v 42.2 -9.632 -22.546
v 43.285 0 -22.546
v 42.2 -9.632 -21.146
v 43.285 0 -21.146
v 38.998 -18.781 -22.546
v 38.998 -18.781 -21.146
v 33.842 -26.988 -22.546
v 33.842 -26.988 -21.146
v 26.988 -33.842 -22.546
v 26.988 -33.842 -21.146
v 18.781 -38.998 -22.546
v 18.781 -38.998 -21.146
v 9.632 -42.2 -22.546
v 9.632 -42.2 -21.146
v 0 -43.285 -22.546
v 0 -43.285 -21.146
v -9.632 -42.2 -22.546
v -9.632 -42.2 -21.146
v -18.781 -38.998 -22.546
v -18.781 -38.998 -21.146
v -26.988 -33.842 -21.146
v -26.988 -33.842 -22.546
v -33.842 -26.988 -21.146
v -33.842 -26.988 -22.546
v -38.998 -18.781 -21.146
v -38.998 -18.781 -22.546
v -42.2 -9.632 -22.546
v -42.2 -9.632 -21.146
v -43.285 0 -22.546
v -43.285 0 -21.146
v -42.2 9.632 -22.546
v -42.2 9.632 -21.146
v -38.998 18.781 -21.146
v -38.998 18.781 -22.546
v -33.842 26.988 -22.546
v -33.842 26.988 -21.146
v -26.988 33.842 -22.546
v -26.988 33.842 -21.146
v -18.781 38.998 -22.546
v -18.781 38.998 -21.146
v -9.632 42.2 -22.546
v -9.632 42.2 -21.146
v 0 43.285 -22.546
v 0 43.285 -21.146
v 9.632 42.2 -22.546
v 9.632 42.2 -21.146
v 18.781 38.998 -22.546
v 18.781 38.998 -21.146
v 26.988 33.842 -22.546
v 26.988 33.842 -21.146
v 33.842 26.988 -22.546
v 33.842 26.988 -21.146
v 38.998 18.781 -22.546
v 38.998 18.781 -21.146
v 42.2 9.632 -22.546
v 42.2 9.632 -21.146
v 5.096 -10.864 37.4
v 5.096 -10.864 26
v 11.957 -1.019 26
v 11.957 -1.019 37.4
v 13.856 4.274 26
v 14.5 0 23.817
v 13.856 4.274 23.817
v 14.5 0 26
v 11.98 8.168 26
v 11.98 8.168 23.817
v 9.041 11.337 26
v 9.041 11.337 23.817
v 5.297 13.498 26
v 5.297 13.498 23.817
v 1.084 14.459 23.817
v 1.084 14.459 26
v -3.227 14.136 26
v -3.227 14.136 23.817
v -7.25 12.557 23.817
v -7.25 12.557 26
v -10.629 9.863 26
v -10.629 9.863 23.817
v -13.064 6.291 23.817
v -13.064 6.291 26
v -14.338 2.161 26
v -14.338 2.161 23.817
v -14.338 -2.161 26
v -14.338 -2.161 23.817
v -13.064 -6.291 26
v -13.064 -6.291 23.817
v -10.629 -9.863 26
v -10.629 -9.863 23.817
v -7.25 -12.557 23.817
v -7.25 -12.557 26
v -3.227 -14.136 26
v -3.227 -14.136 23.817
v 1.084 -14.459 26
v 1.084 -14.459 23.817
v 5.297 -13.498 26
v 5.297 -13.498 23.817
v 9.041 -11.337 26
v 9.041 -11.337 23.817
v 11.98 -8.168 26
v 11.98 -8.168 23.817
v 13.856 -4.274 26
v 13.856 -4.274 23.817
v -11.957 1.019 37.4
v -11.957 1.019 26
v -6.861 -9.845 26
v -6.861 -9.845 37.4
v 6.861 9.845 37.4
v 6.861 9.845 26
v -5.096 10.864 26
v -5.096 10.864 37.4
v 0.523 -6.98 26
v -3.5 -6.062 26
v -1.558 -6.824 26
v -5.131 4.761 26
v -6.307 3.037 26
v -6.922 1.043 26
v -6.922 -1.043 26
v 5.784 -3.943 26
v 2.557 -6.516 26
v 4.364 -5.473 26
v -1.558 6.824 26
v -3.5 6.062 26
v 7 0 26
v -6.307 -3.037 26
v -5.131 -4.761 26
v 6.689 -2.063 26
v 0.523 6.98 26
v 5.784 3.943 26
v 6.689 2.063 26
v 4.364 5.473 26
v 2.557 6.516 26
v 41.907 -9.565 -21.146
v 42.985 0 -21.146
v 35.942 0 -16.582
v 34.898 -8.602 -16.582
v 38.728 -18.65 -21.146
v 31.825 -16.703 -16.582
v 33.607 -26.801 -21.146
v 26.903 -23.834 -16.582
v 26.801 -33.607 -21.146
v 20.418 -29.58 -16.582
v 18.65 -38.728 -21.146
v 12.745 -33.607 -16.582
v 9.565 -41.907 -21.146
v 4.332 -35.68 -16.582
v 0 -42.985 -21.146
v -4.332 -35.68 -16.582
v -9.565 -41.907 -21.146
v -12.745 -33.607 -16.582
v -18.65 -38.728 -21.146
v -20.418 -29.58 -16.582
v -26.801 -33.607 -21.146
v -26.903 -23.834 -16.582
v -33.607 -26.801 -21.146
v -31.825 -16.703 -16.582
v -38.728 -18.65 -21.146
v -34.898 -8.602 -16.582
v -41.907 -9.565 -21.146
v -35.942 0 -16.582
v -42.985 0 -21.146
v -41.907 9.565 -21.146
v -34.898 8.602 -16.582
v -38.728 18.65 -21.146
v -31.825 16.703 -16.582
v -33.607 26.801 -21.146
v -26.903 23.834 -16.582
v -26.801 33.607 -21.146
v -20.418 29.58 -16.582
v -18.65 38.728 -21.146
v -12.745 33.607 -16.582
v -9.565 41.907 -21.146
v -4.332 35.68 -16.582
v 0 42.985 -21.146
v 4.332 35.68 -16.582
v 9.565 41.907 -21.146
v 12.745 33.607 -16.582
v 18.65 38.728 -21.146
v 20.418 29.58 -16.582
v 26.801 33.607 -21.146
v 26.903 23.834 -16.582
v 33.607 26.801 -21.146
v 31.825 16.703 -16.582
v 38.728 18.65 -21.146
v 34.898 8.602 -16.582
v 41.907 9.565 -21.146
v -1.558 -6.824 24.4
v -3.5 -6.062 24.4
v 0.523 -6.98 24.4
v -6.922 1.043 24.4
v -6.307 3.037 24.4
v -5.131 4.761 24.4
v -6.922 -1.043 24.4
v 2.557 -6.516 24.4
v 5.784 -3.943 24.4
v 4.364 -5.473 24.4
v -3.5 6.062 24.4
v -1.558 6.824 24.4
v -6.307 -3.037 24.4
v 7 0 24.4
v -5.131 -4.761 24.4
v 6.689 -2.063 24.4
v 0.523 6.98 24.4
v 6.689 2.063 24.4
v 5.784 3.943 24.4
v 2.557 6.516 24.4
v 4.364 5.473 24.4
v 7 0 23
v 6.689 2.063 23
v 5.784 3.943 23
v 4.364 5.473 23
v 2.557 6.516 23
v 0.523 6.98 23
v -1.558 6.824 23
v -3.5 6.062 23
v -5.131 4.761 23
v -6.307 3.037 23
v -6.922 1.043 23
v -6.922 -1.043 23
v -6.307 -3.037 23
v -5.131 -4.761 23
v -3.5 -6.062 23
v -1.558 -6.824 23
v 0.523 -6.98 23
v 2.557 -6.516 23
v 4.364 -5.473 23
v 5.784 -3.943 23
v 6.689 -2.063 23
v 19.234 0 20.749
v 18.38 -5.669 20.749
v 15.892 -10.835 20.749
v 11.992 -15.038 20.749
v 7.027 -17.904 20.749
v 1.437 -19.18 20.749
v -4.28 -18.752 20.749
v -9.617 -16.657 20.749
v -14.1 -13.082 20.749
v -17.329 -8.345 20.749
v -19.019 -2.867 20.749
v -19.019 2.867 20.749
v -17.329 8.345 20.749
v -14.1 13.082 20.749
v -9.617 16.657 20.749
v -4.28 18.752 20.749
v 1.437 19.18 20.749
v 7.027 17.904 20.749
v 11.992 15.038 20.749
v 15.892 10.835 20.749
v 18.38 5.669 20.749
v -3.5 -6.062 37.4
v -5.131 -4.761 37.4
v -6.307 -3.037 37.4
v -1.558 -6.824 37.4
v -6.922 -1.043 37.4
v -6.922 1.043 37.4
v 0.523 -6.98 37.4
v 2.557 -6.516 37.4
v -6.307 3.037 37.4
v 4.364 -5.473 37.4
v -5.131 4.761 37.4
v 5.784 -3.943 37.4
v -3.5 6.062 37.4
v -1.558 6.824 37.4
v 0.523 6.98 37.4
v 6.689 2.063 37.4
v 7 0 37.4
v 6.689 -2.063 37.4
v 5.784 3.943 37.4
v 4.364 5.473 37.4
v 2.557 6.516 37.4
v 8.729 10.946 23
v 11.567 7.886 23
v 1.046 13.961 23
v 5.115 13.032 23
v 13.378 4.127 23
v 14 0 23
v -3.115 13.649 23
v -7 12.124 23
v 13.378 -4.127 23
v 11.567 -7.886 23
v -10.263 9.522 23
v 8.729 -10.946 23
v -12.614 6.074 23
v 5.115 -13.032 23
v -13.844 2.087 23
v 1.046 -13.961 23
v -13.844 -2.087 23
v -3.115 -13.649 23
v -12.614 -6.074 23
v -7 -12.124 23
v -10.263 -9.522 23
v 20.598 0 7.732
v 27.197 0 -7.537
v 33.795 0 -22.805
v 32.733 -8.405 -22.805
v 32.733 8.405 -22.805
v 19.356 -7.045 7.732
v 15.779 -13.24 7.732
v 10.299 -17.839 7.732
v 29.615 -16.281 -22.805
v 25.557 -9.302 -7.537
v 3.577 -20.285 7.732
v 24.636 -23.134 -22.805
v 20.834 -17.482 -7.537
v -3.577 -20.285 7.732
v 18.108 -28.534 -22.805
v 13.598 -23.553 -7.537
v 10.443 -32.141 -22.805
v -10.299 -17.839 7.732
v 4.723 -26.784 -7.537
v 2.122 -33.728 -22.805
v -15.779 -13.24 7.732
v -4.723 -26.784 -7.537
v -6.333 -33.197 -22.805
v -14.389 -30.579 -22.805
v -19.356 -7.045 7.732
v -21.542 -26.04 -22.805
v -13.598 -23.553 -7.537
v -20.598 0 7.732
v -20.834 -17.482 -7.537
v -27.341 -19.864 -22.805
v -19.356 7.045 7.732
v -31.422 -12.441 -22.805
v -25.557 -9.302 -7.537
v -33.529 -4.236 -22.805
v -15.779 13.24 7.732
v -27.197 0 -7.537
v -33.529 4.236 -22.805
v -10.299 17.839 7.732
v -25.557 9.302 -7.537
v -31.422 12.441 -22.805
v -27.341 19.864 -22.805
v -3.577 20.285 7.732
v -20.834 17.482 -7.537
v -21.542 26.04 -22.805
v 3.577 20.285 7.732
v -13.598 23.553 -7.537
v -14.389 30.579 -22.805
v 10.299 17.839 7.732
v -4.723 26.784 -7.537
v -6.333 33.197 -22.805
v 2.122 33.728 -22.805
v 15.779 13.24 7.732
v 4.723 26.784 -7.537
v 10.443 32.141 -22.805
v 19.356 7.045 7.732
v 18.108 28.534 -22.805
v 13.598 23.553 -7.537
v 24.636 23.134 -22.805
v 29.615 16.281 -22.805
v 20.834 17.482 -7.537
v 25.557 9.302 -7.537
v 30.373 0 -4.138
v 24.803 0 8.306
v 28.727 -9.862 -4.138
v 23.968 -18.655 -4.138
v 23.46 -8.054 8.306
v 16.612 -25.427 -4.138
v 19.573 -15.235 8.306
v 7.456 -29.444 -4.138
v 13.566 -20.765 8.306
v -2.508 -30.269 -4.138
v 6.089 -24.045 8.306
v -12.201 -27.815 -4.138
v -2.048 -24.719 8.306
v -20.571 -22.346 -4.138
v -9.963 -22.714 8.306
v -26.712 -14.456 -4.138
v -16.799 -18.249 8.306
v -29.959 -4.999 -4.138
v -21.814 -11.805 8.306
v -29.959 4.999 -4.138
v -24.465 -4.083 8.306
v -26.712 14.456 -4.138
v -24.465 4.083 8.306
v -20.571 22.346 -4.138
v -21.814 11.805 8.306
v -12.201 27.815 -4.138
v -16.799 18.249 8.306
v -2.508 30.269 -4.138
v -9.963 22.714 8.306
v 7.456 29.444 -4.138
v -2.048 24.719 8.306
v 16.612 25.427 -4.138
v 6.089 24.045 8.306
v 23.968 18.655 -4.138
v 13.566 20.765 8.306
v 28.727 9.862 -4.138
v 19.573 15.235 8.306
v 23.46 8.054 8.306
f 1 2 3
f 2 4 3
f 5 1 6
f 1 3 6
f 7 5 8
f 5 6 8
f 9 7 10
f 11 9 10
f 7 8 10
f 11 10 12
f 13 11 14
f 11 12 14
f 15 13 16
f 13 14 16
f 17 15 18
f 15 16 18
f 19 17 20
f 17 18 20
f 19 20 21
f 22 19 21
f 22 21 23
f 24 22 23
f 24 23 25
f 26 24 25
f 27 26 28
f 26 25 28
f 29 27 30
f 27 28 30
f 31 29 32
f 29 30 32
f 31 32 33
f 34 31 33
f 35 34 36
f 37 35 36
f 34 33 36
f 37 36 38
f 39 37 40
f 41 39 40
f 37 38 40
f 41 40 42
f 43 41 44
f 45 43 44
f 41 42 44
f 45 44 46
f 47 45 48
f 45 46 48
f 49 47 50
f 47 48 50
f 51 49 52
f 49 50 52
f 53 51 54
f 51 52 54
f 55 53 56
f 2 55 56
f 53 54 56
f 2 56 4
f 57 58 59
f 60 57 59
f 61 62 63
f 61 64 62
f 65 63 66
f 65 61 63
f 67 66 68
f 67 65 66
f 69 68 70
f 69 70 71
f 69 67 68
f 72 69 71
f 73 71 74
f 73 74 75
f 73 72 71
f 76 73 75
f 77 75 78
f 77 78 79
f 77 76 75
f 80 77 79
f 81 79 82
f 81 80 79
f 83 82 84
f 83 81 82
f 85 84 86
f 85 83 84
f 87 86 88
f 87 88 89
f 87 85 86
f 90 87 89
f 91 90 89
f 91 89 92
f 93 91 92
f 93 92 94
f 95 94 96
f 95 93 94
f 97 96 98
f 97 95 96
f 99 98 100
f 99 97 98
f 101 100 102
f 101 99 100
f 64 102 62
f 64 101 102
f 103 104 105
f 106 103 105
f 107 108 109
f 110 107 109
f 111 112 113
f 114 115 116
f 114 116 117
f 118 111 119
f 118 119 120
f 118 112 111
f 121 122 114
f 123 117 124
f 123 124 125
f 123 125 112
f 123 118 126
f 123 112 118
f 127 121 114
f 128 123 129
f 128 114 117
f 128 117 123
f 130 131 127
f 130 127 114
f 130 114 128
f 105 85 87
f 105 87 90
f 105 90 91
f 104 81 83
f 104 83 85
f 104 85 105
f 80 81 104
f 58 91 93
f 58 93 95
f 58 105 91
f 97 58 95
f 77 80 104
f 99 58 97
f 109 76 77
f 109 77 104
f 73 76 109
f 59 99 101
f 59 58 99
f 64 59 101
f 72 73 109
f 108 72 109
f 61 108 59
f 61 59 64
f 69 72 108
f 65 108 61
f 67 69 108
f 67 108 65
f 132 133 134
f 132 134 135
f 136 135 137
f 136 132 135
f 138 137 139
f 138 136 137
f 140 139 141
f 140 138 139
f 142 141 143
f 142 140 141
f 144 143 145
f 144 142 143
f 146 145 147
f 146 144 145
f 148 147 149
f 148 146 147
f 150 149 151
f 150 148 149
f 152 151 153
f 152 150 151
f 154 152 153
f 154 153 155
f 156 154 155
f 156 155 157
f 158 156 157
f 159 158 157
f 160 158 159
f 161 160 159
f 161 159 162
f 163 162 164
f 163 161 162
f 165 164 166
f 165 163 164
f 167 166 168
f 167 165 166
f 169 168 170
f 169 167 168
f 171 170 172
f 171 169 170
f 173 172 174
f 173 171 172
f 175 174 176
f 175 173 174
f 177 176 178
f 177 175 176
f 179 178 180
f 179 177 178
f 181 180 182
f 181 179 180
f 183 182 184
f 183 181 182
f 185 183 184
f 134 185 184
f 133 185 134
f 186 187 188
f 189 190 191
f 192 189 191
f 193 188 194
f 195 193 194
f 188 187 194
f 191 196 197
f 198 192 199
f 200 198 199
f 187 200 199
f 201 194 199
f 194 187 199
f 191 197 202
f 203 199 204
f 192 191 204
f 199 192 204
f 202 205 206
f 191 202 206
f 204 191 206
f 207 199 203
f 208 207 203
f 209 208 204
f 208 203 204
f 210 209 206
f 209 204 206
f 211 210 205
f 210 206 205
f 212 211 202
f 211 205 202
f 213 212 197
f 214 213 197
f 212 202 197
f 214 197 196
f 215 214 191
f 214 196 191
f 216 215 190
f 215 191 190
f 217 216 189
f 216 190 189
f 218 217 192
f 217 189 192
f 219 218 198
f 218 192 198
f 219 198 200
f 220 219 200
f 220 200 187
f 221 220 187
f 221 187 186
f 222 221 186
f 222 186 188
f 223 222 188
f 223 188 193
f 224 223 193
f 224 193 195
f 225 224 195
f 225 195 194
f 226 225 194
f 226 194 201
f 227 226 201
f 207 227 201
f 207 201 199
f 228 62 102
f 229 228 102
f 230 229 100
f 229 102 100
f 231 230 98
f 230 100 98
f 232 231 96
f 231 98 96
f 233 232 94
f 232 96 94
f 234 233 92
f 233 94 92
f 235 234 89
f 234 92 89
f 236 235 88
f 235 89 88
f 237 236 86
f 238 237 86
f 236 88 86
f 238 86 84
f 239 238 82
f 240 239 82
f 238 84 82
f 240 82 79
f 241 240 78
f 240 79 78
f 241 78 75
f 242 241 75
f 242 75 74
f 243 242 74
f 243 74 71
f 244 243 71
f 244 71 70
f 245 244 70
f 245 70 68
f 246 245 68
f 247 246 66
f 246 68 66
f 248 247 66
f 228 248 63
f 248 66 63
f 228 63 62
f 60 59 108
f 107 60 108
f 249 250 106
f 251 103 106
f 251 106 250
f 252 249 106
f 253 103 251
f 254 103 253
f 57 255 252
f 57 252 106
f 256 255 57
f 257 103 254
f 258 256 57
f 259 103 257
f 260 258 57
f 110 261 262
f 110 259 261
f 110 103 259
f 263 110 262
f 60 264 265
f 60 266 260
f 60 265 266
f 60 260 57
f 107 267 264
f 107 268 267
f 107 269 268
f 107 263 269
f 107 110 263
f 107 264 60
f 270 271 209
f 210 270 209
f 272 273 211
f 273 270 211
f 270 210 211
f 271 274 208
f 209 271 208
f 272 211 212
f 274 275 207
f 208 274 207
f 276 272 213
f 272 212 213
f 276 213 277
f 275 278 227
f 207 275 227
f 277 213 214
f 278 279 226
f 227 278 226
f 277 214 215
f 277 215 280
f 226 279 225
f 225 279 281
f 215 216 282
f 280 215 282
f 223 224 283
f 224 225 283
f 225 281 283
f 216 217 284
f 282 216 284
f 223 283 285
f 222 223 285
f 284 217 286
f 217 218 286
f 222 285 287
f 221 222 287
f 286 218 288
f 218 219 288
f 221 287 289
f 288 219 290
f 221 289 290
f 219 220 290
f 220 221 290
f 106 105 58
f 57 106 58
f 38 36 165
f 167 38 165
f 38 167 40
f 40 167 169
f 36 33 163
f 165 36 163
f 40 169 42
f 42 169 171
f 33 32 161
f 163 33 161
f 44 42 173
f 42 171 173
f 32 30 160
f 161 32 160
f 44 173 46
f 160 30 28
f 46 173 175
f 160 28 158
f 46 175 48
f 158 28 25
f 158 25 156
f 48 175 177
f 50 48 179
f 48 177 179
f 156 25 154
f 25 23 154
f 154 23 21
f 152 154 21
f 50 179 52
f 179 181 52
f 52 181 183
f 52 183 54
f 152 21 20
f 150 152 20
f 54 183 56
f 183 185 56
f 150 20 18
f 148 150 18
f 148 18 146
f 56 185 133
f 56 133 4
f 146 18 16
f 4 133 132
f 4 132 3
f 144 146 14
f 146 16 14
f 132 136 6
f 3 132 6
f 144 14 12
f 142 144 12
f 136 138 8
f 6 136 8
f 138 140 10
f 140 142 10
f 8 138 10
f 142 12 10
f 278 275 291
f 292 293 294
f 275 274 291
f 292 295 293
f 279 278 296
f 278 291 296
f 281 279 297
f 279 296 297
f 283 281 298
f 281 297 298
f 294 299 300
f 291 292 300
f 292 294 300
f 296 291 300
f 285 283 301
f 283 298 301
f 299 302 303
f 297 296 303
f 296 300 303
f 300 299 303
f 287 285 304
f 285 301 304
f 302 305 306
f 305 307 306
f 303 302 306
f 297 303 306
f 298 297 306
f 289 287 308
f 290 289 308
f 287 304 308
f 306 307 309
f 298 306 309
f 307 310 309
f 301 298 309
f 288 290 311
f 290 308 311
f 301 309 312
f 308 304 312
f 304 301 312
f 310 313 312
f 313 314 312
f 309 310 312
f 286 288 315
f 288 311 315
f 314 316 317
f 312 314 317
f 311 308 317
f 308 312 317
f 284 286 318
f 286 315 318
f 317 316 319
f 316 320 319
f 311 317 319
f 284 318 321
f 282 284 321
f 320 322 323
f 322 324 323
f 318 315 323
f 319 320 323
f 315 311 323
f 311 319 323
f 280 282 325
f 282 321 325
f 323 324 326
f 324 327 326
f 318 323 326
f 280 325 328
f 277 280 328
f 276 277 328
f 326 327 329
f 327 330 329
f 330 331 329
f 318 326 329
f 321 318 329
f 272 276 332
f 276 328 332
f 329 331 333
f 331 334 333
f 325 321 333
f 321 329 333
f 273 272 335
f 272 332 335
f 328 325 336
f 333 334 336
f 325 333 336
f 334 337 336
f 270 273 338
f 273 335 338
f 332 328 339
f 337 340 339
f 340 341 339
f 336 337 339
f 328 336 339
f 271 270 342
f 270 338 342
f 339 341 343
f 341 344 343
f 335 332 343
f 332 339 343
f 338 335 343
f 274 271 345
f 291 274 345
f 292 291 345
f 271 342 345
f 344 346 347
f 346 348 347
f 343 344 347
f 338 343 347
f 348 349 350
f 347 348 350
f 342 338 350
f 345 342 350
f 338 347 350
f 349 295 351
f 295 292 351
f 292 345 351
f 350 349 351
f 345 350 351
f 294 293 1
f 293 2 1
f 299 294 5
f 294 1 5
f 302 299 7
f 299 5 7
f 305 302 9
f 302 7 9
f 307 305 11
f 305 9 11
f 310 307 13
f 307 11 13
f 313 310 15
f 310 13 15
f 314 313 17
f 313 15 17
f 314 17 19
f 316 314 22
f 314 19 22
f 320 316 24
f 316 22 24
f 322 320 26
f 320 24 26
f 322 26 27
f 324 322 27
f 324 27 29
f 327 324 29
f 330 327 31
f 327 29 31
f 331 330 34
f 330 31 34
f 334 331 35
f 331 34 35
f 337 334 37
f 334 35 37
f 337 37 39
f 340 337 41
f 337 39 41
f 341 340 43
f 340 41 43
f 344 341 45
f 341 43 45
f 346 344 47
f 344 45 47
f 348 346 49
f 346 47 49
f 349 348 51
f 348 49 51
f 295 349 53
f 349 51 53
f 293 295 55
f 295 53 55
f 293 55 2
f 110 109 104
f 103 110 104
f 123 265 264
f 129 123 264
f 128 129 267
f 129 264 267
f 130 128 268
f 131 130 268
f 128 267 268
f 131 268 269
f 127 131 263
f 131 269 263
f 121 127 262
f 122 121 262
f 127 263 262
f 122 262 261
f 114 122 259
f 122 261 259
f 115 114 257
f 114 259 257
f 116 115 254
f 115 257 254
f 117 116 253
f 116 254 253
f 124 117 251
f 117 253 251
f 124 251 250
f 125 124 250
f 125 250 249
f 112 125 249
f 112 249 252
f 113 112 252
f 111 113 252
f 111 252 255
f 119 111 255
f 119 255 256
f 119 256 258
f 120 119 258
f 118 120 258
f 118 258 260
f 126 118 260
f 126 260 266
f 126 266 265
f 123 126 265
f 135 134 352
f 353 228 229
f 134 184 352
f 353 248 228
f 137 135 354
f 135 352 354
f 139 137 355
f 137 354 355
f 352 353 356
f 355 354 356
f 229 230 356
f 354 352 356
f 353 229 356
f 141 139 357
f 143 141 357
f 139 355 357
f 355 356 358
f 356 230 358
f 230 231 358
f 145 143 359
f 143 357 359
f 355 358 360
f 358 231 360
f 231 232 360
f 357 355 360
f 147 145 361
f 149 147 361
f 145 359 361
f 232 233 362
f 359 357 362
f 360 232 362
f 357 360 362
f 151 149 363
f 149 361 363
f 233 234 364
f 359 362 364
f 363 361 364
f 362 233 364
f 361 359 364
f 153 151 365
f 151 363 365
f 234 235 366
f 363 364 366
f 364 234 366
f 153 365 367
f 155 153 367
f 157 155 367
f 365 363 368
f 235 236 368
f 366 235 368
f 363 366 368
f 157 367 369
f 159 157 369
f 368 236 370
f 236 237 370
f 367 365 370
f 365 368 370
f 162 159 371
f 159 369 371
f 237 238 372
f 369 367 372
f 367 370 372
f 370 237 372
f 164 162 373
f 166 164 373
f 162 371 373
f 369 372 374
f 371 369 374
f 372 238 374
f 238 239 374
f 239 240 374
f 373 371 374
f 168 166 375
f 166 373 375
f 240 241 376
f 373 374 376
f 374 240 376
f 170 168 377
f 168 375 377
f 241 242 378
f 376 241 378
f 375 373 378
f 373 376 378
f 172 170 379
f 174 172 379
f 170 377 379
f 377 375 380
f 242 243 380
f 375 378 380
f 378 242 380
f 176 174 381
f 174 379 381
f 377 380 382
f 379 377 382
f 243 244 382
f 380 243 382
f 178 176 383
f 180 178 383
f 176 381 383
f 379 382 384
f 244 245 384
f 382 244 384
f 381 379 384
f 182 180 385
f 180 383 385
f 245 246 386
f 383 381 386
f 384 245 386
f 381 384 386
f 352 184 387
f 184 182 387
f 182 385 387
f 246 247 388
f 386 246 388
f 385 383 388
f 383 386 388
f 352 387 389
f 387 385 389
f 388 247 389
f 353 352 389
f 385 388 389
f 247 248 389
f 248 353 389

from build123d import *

# Parameters (mm, degrees)
F4_DEPTH    = 13
F5_R        = 7
F6_DEPTH    = 15
F7_R        = 14.5
F8_DEPTH    = 1.6
F9_S5_R     = 14.5
F9_T6_DEPTH = 29
F10_SIZE    = 5


# Not quite as in the source:
# - a fillet or chamfer that OpenCascade refuses, or shapes differently, is made with other operations: its cross-section is extruded or revolved along the edge and cut away or added
# - a feature names something its author has since deleted; it is built from what else it names


with BuildPart() as f2:
    # F0 (on Front) → F2 (revolve)
    with BuildSketch(Plane.XZ):
        Polygon((17.6, 24.4003517207), (0, 24.4003517207), (0, 23.0003517207), (14, 23.0003517207), (33.795146799, -22.8053483963), (43.2849223453, -22.5459427606), (43.2849223453, -21.1459427606), (37.9849223453, -21.1459427606), align=None)
    revolve(axis=Axis((0, 0, 12.0206931606), (0, 0, -1)))

    # F3 (on face) → F4 (join)
    with BuildSketch(Plane.XY.offset(24.4003517207)):
        Polygon((-11.9566419536, 1.0191727989), (-6.8609505115, -9.8451692763), (5.0956914421, -10.8643420752), (11.9566419536, -1.0191727989), (6.8609505115, 9.8451692763), (-5.0956914421, 10.8643420752), align=None)
    extrude(amount=F4_DEPTH)

    # F5 (on face) → F6 (cut)
    with BuildSketch(Plane.XY.offset(37.4003517207)):
        Circle(F5_R)
    extrude(amount=-F6_DEPTH, mode=Mode.SUBTRACT)

    # F7 (on face) → F8 (join)
    with BuildSketch(Plane.XY.offset(24.4003517207)):
        Circle(F7_R)
    extrude(amount=F8_DEPTH)

    # F9: chamfer of 4 on 1 edges, made by hand


with BuildPart() as f9_tool2:
    # F9_s3 → F9_t4 (revolve)
    with BuildSketch(Plane.XZ):
        Polygon((19.2340619114, 20.749346151), (13.6, 24.4003517207), (17.6, 24.4003517207), align=None)
    revolve(axis=Axis((0, 0, 24.4003517207), (0, 0, -1)))

    # F9_s5 → F9_t6 (cut, symmetric)
    with BuildSketch(Plane.XY.offset(22.6)):
        Circle(F9_S5_R)
    extrude(amount=F9_T6_DEPTH, both=True, mode=Mode.SUBTRACT)


with BuildPart() as f2_1:
    add(f2.part)

    # F9_t1: cut F9_tool2
    add(f9_tool2.part, mode=Mode.SUBTRACT)

    # F10
    f10_edges = [f2_1.edges().sort_by_distance(p)[0] for p in [
        (-37.984922, 0, -21.145943),
    ]]
    chamfer(f10_edges, length=F10_SIZE)


solid = f2_1.part
